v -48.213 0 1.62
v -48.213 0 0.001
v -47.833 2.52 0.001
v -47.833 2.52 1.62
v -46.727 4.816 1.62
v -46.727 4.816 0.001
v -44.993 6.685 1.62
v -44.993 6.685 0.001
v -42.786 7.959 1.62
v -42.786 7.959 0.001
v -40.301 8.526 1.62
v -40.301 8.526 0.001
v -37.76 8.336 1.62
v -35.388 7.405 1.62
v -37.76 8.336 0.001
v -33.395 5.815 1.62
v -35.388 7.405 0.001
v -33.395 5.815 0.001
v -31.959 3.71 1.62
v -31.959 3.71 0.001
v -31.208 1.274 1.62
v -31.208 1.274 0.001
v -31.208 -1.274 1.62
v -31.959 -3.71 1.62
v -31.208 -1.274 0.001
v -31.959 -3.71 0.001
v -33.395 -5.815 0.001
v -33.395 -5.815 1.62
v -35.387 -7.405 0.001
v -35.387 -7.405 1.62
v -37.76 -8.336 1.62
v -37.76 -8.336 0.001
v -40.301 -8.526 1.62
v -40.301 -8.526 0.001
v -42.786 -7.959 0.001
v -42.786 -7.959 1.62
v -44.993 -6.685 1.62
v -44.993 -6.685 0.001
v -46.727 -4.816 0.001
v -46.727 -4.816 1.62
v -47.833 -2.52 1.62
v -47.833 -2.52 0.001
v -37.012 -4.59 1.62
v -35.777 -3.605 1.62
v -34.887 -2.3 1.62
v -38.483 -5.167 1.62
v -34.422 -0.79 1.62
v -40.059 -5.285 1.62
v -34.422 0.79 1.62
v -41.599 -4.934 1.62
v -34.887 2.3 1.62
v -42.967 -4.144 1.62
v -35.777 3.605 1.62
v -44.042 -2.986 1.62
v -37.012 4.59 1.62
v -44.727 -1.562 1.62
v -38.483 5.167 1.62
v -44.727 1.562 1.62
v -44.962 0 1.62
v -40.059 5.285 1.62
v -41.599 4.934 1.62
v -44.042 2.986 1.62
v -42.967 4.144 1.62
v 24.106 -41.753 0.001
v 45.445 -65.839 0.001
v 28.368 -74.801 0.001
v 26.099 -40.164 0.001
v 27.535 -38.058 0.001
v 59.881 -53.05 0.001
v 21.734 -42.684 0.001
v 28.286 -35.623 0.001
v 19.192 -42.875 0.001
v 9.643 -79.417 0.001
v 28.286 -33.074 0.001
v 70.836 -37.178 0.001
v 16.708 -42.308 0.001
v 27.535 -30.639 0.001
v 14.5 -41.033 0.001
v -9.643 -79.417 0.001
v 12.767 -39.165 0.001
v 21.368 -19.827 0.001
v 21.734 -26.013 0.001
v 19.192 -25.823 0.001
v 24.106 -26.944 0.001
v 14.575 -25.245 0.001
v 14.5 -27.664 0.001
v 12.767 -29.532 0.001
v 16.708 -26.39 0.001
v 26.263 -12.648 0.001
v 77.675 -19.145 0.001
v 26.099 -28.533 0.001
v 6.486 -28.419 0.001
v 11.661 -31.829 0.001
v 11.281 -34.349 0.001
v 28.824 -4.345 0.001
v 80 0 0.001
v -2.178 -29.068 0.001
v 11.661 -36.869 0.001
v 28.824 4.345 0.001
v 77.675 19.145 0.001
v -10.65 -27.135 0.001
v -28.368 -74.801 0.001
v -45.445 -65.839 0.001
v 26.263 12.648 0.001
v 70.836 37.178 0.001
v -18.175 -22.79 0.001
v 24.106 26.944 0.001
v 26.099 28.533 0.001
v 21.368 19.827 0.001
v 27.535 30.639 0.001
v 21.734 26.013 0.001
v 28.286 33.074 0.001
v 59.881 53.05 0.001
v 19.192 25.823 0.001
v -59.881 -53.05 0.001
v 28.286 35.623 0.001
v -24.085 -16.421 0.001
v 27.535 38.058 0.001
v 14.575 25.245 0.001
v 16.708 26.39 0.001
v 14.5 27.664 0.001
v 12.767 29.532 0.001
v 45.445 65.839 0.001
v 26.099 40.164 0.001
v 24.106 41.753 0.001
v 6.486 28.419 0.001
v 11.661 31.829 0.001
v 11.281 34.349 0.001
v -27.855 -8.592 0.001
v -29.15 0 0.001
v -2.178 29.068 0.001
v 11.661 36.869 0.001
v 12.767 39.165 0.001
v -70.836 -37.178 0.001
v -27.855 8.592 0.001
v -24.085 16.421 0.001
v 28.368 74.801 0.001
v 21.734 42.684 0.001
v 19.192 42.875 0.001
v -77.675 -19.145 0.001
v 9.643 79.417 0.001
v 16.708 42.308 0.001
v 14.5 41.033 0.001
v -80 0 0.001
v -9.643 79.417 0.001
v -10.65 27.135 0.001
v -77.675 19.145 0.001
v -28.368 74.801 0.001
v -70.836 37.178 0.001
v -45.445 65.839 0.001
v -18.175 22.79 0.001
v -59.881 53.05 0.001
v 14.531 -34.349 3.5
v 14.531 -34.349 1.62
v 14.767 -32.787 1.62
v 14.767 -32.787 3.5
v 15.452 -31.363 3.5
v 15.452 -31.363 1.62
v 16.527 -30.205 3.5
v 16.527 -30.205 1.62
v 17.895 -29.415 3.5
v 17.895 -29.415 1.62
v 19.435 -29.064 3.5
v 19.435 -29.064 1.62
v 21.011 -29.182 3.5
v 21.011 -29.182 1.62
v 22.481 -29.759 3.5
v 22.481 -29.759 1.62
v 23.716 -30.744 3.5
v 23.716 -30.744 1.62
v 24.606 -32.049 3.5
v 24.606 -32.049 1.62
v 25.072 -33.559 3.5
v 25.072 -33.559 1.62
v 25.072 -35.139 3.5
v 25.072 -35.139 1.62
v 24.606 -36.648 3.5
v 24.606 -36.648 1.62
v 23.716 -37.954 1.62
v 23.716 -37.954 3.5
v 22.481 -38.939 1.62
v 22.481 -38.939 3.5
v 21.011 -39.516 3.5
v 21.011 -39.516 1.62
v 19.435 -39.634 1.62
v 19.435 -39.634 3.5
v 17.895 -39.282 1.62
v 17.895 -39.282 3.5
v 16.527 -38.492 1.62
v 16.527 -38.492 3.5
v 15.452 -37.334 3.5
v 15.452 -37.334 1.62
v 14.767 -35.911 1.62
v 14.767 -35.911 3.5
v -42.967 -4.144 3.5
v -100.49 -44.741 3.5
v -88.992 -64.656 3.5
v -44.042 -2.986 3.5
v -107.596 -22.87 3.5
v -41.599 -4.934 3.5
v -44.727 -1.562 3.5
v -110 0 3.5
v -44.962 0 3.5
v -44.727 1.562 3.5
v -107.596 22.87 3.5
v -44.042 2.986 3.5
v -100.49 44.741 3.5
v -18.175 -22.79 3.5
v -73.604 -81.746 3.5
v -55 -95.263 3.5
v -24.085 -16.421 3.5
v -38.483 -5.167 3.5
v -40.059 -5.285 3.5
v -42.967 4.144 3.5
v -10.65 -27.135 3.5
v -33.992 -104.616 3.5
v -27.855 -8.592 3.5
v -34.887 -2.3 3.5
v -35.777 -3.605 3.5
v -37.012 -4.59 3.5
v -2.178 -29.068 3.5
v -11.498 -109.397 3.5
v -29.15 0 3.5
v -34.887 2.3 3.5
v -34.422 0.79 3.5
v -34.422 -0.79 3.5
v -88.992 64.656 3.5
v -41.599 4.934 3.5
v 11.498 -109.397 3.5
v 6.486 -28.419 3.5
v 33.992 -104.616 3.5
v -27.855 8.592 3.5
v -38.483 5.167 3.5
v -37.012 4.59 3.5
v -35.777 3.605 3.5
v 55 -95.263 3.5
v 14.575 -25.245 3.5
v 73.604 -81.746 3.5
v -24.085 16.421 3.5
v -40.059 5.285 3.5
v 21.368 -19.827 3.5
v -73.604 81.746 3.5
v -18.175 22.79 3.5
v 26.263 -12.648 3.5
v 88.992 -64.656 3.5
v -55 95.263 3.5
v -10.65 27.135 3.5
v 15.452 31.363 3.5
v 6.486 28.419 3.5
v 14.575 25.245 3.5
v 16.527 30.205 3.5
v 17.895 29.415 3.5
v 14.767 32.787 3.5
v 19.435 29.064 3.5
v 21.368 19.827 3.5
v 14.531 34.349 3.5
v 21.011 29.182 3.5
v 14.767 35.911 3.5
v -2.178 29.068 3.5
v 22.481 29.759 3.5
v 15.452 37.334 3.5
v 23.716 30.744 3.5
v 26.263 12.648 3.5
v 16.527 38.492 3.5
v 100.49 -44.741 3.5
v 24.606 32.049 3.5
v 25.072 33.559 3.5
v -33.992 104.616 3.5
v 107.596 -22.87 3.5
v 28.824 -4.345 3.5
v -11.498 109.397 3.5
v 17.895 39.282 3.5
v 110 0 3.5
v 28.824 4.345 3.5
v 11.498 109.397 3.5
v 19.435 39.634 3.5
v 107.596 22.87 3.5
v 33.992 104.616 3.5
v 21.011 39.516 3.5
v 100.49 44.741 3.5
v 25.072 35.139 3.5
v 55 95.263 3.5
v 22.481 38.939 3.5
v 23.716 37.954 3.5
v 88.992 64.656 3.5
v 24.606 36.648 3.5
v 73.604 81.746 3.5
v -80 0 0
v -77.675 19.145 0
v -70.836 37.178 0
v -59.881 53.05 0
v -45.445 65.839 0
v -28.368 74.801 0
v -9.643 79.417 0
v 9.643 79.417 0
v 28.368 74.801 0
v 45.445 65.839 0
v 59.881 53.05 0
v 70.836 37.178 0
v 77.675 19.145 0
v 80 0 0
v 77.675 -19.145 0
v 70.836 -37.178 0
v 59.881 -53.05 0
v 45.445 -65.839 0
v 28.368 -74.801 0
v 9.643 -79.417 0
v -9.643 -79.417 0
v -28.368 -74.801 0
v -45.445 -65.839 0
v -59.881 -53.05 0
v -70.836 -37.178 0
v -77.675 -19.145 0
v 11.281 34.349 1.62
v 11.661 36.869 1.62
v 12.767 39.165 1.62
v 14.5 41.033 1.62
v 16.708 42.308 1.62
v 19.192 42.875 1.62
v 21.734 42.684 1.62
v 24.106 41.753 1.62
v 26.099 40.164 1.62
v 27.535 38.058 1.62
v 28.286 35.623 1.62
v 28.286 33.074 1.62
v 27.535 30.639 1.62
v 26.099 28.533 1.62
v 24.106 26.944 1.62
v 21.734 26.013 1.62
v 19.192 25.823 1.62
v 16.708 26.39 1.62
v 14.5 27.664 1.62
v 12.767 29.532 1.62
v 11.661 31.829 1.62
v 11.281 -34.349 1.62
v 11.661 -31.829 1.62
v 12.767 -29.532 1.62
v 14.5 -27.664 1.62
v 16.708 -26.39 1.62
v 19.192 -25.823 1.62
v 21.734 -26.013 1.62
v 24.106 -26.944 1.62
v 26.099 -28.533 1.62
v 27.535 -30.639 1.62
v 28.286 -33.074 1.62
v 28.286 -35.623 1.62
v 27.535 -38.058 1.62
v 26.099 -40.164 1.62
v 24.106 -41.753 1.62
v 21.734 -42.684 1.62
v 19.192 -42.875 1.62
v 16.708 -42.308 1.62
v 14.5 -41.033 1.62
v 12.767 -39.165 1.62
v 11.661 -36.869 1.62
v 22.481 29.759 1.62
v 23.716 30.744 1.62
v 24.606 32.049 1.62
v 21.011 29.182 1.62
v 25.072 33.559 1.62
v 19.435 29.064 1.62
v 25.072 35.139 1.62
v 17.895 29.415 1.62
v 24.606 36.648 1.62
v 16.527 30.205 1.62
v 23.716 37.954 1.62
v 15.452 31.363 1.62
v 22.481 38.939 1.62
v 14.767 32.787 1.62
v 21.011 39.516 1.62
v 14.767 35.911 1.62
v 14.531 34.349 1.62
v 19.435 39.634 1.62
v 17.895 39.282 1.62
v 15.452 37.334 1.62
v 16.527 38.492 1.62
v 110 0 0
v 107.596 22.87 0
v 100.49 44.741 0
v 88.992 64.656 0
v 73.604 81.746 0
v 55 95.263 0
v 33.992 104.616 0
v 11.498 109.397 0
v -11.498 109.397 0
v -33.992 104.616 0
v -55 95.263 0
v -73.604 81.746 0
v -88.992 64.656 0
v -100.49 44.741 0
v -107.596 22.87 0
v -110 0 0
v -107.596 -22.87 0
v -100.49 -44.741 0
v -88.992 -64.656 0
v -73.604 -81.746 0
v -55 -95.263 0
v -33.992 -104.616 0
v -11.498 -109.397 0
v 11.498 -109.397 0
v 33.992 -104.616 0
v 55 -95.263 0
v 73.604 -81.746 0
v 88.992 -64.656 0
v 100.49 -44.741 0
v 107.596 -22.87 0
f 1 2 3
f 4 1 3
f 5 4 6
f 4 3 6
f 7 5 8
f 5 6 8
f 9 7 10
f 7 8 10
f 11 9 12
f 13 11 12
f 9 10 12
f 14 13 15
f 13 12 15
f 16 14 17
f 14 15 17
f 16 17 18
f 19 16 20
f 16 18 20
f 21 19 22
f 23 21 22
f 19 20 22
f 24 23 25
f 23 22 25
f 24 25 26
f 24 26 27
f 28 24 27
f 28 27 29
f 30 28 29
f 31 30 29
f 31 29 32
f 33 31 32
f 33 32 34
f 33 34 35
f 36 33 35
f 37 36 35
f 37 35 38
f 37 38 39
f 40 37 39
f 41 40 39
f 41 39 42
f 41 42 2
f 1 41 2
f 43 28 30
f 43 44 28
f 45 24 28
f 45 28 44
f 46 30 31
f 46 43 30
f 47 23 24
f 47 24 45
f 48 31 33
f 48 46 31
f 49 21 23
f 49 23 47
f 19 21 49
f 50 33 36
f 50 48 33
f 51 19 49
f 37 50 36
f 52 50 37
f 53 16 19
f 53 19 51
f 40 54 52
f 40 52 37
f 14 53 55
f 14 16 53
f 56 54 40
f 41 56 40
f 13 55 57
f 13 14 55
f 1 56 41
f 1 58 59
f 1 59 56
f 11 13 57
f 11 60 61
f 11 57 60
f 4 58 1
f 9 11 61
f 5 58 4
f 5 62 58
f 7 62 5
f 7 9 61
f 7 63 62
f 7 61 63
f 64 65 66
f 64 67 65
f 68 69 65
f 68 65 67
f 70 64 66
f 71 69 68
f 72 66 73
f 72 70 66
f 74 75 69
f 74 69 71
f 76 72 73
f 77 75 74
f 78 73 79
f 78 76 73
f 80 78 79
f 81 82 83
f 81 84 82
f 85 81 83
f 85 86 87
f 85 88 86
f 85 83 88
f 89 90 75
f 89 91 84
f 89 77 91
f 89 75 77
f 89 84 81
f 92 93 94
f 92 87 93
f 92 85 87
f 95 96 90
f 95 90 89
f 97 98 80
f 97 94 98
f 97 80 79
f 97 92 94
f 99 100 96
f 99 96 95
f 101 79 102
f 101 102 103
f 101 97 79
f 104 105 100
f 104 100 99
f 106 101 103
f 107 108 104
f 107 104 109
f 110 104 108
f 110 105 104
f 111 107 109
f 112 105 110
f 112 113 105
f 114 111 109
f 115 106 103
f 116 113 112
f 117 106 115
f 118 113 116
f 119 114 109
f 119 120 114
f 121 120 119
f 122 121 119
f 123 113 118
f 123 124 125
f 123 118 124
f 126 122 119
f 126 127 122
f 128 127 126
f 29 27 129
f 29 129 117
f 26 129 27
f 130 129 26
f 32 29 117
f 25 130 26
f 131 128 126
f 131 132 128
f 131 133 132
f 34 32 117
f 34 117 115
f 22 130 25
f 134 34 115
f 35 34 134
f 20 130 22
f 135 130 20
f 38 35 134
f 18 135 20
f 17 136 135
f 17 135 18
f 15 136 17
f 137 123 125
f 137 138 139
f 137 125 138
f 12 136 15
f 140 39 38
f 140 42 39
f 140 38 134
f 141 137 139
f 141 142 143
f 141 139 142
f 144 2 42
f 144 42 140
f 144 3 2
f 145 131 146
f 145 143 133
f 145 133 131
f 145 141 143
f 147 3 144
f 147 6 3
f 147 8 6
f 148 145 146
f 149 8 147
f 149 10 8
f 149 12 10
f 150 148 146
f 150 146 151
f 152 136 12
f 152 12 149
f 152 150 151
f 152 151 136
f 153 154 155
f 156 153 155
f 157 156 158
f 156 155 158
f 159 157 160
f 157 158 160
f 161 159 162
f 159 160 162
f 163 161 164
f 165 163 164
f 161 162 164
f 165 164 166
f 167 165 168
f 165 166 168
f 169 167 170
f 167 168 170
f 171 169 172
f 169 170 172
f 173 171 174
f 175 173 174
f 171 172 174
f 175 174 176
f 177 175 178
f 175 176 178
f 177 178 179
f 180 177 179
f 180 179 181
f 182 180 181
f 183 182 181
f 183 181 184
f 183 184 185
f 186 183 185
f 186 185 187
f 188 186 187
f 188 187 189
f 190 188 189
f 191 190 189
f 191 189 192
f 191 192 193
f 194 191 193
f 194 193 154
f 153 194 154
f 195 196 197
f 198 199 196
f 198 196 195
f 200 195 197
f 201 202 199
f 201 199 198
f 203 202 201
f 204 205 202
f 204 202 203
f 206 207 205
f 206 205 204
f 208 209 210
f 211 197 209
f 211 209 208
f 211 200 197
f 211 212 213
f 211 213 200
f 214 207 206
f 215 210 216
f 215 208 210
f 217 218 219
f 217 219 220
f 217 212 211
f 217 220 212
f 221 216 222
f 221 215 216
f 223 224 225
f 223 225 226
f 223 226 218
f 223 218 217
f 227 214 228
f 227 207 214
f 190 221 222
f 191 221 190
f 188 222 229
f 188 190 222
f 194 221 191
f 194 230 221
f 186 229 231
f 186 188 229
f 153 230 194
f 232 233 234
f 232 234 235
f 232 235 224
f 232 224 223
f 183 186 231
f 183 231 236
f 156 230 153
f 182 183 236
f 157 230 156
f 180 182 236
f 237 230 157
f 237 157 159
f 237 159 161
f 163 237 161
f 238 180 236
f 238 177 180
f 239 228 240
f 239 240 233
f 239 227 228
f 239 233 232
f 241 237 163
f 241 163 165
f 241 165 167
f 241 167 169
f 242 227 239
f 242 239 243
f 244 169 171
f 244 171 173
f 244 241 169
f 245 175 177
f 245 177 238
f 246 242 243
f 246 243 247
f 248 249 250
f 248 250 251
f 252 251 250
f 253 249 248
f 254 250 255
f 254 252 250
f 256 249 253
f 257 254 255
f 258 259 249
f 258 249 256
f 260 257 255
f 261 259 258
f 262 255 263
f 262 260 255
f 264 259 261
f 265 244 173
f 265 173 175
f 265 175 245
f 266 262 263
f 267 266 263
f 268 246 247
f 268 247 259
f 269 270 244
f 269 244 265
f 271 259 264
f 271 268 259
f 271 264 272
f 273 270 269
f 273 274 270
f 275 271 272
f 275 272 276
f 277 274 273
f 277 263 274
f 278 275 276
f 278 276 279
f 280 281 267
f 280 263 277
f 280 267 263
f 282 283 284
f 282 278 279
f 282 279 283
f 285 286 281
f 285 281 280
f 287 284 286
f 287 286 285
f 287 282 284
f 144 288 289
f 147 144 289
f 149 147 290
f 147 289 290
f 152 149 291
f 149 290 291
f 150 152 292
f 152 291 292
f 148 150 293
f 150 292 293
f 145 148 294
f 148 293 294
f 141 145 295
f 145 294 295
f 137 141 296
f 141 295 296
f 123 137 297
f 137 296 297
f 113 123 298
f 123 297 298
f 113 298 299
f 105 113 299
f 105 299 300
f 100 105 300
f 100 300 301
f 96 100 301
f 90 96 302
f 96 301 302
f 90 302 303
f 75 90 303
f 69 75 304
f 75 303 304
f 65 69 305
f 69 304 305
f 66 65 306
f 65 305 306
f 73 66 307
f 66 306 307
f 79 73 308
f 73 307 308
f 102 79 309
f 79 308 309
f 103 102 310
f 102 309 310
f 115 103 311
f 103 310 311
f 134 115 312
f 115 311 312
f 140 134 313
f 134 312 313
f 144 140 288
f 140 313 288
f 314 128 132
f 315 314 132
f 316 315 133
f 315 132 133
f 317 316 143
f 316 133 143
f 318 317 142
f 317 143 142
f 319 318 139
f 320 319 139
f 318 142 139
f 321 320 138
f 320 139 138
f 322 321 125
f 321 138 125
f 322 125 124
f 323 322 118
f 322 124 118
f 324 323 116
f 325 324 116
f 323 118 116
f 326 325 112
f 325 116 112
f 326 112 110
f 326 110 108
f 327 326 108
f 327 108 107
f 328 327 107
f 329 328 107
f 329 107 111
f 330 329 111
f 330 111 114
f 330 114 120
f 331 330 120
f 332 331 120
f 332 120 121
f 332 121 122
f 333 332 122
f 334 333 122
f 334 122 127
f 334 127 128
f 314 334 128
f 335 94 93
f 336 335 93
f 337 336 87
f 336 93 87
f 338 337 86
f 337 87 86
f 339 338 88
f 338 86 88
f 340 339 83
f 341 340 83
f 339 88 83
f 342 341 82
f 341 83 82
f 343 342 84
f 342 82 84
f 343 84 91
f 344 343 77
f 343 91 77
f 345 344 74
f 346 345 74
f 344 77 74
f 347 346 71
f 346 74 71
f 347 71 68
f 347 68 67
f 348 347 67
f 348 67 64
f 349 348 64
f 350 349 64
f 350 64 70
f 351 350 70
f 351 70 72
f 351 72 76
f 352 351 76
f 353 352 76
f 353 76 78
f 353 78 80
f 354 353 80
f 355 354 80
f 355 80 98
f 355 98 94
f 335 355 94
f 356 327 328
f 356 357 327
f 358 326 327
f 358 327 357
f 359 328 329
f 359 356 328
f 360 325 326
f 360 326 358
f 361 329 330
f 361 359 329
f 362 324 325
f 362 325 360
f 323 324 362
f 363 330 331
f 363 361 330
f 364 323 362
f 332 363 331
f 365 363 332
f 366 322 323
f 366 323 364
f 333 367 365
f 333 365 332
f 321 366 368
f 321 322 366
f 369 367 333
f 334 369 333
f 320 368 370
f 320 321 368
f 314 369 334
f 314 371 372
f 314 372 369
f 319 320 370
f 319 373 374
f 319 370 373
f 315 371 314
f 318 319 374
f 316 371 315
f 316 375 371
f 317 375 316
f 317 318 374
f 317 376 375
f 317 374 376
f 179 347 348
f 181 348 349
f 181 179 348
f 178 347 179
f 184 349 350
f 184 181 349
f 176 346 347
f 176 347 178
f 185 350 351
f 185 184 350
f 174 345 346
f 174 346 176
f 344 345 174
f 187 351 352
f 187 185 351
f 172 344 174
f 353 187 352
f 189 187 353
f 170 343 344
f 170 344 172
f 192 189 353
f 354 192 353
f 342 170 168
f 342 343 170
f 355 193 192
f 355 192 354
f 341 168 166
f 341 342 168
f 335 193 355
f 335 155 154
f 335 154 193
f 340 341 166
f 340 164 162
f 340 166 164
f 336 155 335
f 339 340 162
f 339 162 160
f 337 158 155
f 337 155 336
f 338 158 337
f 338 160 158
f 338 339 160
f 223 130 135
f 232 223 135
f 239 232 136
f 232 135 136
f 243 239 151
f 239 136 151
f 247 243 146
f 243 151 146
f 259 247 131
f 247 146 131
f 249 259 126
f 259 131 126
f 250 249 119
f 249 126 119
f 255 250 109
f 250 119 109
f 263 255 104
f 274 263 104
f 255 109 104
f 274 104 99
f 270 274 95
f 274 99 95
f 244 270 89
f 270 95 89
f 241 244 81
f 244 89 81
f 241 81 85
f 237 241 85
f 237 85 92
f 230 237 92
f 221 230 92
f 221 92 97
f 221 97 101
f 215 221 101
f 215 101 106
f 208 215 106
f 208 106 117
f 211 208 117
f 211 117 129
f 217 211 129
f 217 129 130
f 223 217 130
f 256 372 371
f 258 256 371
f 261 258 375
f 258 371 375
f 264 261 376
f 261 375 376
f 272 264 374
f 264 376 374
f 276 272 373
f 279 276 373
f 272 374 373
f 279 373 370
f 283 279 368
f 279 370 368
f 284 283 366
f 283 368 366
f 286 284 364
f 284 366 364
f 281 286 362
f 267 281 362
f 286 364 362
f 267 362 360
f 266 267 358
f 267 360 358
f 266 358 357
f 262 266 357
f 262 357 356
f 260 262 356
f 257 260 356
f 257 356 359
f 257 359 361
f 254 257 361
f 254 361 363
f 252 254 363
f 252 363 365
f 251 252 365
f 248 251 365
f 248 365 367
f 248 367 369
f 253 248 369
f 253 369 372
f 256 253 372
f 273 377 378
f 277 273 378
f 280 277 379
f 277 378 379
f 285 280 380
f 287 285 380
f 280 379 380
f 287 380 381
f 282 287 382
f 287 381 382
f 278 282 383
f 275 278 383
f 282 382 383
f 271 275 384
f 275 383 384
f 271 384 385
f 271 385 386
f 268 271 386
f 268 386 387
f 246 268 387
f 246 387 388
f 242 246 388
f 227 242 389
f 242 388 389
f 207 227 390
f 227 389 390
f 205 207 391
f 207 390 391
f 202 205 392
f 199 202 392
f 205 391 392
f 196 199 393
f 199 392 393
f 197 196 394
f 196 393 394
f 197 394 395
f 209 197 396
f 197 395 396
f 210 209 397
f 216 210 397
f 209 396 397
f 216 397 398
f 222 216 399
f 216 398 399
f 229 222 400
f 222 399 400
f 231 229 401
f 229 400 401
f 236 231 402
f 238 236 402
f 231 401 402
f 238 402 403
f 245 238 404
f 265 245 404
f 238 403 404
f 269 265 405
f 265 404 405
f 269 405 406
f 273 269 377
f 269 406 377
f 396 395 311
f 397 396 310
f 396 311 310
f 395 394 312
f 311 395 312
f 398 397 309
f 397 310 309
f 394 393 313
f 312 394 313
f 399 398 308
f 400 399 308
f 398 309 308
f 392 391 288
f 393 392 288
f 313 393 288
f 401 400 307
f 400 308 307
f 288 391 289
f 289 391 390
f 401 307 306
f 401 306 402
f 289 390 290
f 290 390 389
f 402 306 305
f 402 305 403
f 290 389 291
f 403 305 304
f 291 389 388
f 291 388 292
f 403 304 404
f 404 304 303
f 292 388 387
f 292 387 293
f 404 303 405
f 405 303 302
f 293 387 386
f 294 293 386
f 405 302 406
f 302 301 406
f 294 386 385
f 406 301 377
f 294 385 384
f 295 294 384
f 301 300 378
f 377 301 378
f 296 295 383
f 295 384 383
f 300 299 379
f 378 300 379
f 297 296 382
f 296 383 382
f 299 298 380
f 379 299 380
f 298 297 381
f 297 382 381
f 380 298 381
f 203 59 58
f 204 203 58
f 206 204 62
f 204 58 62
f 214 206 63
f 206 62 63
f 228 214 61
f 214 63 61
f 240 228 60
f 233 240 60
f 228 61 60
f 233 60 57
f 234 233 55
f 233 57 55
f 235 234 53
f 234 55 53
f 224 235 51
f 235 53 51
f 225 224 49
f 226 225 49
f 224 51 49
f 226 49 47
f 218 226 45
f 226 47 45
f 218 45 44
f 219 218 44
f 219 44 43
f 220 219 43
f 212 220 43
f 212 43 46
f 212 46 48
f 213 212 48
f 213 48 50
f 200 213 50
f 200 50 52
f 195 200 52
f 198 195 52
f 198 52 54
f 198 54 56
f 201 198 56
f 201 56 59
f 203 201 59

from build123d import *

# Parameters (mm, degrees)
SKETCH1_R           = 110
BOSS_EXTRUDE1_DEPTH = 3.5
SKETCH2_R           = 80
BOSS_EXTRUDE2_DEPTH = 0.001
SKETCH3_R           = 29.15
CUT_EXTRUDE1_DEPTH  = 4.5
SKETCH6_R           = 8.55
SKETCH6_R_2         = 5.3
CUT_EXTRUDE3_DEPTH  = 1.62
SKETCH7_R           = 5.3
CUT_EXTRUDE4_DEPTH  = 4.5
SKETCH8_R           = 80
CUT_EXTRUDE5_DEPTH  = 0.001


with BuildPart() as part:
    # Sketch1 → Boss-Extrude1 (new body)
    with BuildSketch(Plane.XY):
        Circle(SKETCH1_R)
    extrude(amount=BOSS_EXTRUDE1_DEPTH)

    # Sketch2 → Boss-Extrude2 (add)
    with BuildSketch(Plane(origin=(0, 0, 0), x_dir=(-1, 0, 0), z_dir=(0, 0, -1))):
        Circle(SKETCH2_R)
    extrude(amount=-BOSS_EXTRUDE2_DEPTH)

    # Sketch3 → Cut-Extrude1 (cut, through all)
    with BuildSketch(Plane(origin=(0, 0, 0), x_dir=(-1, 0, 0), z_dir=(0, 0, -1))):
        Circle(SKETCH3_R)
    extrude(amount=-CUT_EXTRUDE1_DEPTH, mode=Mode.SUBTRACT)

    # Sketch6 → Cut-Extrude3 (cut)
    with BuildSketch(Plane(origin=(0, 0, 0), x_dir=(-1, 0, 0), z_dir=(0, 0, -1))):
        with Locations((39.6625, 0)):
            Circle(SKETCH6_R)
        with Locations((39.6625, 0)):
            Circle(SKETCH6_R_2, mode=Mode.SUBTRACT)
        with Locations((-19.83125, -34.348732578)):
            Circle(SKETCH6_R)
        with Locations((-19.83125, -34.348732578)):
            Circle(SKETCH6_R_2, mode=Mode.SUBTRACT)
        with Locations((-19.83125, 34.348732578)):
            Circle(SKETCH6_R)
        with Locations((-19.83125, 34.348732578)):
            Circle(SKETCH6_R_2, mode=Mode.SUBTRACT)
    extrude(amount=-CUT_EXTRUDE3_DEPTH, mode=Mode.SUBTRACT)

    # Sketch7 → Cut-Extrude4 (cut, through all)
    with BuildSketch(Plane(origin=(0, 0, 0), x_dir=(-1, 0, 0), z_dir=(0, 0, -1))):
        with Locations((-19.83125, -34.348732578)):
            Circle(SKETCH7_R)
        with Locations((39.6625, 0)):
            Circle(SKETCH7_R)
        with Locations((-19.83125, 34.348732578)):
            Circle(SKETCH7_R)
    extrude(amount=-CUT_EXTRUDE4_DEPTH, mode=Mode.SUBTRACT)

    # Sketch8 → Cut-Extrude5 (cut)
    with BuildSketch(Plane(origin=(0, 0, 0), x_dir=(-1, 0, 0), z_dir=(0, 0, -1))):
        Circle(SKETCH8_R)
    extrude(amount=-CUT_EXTRUDE5_DEPTH, mode=Mode.SUBTRACT)


solid = part.part
